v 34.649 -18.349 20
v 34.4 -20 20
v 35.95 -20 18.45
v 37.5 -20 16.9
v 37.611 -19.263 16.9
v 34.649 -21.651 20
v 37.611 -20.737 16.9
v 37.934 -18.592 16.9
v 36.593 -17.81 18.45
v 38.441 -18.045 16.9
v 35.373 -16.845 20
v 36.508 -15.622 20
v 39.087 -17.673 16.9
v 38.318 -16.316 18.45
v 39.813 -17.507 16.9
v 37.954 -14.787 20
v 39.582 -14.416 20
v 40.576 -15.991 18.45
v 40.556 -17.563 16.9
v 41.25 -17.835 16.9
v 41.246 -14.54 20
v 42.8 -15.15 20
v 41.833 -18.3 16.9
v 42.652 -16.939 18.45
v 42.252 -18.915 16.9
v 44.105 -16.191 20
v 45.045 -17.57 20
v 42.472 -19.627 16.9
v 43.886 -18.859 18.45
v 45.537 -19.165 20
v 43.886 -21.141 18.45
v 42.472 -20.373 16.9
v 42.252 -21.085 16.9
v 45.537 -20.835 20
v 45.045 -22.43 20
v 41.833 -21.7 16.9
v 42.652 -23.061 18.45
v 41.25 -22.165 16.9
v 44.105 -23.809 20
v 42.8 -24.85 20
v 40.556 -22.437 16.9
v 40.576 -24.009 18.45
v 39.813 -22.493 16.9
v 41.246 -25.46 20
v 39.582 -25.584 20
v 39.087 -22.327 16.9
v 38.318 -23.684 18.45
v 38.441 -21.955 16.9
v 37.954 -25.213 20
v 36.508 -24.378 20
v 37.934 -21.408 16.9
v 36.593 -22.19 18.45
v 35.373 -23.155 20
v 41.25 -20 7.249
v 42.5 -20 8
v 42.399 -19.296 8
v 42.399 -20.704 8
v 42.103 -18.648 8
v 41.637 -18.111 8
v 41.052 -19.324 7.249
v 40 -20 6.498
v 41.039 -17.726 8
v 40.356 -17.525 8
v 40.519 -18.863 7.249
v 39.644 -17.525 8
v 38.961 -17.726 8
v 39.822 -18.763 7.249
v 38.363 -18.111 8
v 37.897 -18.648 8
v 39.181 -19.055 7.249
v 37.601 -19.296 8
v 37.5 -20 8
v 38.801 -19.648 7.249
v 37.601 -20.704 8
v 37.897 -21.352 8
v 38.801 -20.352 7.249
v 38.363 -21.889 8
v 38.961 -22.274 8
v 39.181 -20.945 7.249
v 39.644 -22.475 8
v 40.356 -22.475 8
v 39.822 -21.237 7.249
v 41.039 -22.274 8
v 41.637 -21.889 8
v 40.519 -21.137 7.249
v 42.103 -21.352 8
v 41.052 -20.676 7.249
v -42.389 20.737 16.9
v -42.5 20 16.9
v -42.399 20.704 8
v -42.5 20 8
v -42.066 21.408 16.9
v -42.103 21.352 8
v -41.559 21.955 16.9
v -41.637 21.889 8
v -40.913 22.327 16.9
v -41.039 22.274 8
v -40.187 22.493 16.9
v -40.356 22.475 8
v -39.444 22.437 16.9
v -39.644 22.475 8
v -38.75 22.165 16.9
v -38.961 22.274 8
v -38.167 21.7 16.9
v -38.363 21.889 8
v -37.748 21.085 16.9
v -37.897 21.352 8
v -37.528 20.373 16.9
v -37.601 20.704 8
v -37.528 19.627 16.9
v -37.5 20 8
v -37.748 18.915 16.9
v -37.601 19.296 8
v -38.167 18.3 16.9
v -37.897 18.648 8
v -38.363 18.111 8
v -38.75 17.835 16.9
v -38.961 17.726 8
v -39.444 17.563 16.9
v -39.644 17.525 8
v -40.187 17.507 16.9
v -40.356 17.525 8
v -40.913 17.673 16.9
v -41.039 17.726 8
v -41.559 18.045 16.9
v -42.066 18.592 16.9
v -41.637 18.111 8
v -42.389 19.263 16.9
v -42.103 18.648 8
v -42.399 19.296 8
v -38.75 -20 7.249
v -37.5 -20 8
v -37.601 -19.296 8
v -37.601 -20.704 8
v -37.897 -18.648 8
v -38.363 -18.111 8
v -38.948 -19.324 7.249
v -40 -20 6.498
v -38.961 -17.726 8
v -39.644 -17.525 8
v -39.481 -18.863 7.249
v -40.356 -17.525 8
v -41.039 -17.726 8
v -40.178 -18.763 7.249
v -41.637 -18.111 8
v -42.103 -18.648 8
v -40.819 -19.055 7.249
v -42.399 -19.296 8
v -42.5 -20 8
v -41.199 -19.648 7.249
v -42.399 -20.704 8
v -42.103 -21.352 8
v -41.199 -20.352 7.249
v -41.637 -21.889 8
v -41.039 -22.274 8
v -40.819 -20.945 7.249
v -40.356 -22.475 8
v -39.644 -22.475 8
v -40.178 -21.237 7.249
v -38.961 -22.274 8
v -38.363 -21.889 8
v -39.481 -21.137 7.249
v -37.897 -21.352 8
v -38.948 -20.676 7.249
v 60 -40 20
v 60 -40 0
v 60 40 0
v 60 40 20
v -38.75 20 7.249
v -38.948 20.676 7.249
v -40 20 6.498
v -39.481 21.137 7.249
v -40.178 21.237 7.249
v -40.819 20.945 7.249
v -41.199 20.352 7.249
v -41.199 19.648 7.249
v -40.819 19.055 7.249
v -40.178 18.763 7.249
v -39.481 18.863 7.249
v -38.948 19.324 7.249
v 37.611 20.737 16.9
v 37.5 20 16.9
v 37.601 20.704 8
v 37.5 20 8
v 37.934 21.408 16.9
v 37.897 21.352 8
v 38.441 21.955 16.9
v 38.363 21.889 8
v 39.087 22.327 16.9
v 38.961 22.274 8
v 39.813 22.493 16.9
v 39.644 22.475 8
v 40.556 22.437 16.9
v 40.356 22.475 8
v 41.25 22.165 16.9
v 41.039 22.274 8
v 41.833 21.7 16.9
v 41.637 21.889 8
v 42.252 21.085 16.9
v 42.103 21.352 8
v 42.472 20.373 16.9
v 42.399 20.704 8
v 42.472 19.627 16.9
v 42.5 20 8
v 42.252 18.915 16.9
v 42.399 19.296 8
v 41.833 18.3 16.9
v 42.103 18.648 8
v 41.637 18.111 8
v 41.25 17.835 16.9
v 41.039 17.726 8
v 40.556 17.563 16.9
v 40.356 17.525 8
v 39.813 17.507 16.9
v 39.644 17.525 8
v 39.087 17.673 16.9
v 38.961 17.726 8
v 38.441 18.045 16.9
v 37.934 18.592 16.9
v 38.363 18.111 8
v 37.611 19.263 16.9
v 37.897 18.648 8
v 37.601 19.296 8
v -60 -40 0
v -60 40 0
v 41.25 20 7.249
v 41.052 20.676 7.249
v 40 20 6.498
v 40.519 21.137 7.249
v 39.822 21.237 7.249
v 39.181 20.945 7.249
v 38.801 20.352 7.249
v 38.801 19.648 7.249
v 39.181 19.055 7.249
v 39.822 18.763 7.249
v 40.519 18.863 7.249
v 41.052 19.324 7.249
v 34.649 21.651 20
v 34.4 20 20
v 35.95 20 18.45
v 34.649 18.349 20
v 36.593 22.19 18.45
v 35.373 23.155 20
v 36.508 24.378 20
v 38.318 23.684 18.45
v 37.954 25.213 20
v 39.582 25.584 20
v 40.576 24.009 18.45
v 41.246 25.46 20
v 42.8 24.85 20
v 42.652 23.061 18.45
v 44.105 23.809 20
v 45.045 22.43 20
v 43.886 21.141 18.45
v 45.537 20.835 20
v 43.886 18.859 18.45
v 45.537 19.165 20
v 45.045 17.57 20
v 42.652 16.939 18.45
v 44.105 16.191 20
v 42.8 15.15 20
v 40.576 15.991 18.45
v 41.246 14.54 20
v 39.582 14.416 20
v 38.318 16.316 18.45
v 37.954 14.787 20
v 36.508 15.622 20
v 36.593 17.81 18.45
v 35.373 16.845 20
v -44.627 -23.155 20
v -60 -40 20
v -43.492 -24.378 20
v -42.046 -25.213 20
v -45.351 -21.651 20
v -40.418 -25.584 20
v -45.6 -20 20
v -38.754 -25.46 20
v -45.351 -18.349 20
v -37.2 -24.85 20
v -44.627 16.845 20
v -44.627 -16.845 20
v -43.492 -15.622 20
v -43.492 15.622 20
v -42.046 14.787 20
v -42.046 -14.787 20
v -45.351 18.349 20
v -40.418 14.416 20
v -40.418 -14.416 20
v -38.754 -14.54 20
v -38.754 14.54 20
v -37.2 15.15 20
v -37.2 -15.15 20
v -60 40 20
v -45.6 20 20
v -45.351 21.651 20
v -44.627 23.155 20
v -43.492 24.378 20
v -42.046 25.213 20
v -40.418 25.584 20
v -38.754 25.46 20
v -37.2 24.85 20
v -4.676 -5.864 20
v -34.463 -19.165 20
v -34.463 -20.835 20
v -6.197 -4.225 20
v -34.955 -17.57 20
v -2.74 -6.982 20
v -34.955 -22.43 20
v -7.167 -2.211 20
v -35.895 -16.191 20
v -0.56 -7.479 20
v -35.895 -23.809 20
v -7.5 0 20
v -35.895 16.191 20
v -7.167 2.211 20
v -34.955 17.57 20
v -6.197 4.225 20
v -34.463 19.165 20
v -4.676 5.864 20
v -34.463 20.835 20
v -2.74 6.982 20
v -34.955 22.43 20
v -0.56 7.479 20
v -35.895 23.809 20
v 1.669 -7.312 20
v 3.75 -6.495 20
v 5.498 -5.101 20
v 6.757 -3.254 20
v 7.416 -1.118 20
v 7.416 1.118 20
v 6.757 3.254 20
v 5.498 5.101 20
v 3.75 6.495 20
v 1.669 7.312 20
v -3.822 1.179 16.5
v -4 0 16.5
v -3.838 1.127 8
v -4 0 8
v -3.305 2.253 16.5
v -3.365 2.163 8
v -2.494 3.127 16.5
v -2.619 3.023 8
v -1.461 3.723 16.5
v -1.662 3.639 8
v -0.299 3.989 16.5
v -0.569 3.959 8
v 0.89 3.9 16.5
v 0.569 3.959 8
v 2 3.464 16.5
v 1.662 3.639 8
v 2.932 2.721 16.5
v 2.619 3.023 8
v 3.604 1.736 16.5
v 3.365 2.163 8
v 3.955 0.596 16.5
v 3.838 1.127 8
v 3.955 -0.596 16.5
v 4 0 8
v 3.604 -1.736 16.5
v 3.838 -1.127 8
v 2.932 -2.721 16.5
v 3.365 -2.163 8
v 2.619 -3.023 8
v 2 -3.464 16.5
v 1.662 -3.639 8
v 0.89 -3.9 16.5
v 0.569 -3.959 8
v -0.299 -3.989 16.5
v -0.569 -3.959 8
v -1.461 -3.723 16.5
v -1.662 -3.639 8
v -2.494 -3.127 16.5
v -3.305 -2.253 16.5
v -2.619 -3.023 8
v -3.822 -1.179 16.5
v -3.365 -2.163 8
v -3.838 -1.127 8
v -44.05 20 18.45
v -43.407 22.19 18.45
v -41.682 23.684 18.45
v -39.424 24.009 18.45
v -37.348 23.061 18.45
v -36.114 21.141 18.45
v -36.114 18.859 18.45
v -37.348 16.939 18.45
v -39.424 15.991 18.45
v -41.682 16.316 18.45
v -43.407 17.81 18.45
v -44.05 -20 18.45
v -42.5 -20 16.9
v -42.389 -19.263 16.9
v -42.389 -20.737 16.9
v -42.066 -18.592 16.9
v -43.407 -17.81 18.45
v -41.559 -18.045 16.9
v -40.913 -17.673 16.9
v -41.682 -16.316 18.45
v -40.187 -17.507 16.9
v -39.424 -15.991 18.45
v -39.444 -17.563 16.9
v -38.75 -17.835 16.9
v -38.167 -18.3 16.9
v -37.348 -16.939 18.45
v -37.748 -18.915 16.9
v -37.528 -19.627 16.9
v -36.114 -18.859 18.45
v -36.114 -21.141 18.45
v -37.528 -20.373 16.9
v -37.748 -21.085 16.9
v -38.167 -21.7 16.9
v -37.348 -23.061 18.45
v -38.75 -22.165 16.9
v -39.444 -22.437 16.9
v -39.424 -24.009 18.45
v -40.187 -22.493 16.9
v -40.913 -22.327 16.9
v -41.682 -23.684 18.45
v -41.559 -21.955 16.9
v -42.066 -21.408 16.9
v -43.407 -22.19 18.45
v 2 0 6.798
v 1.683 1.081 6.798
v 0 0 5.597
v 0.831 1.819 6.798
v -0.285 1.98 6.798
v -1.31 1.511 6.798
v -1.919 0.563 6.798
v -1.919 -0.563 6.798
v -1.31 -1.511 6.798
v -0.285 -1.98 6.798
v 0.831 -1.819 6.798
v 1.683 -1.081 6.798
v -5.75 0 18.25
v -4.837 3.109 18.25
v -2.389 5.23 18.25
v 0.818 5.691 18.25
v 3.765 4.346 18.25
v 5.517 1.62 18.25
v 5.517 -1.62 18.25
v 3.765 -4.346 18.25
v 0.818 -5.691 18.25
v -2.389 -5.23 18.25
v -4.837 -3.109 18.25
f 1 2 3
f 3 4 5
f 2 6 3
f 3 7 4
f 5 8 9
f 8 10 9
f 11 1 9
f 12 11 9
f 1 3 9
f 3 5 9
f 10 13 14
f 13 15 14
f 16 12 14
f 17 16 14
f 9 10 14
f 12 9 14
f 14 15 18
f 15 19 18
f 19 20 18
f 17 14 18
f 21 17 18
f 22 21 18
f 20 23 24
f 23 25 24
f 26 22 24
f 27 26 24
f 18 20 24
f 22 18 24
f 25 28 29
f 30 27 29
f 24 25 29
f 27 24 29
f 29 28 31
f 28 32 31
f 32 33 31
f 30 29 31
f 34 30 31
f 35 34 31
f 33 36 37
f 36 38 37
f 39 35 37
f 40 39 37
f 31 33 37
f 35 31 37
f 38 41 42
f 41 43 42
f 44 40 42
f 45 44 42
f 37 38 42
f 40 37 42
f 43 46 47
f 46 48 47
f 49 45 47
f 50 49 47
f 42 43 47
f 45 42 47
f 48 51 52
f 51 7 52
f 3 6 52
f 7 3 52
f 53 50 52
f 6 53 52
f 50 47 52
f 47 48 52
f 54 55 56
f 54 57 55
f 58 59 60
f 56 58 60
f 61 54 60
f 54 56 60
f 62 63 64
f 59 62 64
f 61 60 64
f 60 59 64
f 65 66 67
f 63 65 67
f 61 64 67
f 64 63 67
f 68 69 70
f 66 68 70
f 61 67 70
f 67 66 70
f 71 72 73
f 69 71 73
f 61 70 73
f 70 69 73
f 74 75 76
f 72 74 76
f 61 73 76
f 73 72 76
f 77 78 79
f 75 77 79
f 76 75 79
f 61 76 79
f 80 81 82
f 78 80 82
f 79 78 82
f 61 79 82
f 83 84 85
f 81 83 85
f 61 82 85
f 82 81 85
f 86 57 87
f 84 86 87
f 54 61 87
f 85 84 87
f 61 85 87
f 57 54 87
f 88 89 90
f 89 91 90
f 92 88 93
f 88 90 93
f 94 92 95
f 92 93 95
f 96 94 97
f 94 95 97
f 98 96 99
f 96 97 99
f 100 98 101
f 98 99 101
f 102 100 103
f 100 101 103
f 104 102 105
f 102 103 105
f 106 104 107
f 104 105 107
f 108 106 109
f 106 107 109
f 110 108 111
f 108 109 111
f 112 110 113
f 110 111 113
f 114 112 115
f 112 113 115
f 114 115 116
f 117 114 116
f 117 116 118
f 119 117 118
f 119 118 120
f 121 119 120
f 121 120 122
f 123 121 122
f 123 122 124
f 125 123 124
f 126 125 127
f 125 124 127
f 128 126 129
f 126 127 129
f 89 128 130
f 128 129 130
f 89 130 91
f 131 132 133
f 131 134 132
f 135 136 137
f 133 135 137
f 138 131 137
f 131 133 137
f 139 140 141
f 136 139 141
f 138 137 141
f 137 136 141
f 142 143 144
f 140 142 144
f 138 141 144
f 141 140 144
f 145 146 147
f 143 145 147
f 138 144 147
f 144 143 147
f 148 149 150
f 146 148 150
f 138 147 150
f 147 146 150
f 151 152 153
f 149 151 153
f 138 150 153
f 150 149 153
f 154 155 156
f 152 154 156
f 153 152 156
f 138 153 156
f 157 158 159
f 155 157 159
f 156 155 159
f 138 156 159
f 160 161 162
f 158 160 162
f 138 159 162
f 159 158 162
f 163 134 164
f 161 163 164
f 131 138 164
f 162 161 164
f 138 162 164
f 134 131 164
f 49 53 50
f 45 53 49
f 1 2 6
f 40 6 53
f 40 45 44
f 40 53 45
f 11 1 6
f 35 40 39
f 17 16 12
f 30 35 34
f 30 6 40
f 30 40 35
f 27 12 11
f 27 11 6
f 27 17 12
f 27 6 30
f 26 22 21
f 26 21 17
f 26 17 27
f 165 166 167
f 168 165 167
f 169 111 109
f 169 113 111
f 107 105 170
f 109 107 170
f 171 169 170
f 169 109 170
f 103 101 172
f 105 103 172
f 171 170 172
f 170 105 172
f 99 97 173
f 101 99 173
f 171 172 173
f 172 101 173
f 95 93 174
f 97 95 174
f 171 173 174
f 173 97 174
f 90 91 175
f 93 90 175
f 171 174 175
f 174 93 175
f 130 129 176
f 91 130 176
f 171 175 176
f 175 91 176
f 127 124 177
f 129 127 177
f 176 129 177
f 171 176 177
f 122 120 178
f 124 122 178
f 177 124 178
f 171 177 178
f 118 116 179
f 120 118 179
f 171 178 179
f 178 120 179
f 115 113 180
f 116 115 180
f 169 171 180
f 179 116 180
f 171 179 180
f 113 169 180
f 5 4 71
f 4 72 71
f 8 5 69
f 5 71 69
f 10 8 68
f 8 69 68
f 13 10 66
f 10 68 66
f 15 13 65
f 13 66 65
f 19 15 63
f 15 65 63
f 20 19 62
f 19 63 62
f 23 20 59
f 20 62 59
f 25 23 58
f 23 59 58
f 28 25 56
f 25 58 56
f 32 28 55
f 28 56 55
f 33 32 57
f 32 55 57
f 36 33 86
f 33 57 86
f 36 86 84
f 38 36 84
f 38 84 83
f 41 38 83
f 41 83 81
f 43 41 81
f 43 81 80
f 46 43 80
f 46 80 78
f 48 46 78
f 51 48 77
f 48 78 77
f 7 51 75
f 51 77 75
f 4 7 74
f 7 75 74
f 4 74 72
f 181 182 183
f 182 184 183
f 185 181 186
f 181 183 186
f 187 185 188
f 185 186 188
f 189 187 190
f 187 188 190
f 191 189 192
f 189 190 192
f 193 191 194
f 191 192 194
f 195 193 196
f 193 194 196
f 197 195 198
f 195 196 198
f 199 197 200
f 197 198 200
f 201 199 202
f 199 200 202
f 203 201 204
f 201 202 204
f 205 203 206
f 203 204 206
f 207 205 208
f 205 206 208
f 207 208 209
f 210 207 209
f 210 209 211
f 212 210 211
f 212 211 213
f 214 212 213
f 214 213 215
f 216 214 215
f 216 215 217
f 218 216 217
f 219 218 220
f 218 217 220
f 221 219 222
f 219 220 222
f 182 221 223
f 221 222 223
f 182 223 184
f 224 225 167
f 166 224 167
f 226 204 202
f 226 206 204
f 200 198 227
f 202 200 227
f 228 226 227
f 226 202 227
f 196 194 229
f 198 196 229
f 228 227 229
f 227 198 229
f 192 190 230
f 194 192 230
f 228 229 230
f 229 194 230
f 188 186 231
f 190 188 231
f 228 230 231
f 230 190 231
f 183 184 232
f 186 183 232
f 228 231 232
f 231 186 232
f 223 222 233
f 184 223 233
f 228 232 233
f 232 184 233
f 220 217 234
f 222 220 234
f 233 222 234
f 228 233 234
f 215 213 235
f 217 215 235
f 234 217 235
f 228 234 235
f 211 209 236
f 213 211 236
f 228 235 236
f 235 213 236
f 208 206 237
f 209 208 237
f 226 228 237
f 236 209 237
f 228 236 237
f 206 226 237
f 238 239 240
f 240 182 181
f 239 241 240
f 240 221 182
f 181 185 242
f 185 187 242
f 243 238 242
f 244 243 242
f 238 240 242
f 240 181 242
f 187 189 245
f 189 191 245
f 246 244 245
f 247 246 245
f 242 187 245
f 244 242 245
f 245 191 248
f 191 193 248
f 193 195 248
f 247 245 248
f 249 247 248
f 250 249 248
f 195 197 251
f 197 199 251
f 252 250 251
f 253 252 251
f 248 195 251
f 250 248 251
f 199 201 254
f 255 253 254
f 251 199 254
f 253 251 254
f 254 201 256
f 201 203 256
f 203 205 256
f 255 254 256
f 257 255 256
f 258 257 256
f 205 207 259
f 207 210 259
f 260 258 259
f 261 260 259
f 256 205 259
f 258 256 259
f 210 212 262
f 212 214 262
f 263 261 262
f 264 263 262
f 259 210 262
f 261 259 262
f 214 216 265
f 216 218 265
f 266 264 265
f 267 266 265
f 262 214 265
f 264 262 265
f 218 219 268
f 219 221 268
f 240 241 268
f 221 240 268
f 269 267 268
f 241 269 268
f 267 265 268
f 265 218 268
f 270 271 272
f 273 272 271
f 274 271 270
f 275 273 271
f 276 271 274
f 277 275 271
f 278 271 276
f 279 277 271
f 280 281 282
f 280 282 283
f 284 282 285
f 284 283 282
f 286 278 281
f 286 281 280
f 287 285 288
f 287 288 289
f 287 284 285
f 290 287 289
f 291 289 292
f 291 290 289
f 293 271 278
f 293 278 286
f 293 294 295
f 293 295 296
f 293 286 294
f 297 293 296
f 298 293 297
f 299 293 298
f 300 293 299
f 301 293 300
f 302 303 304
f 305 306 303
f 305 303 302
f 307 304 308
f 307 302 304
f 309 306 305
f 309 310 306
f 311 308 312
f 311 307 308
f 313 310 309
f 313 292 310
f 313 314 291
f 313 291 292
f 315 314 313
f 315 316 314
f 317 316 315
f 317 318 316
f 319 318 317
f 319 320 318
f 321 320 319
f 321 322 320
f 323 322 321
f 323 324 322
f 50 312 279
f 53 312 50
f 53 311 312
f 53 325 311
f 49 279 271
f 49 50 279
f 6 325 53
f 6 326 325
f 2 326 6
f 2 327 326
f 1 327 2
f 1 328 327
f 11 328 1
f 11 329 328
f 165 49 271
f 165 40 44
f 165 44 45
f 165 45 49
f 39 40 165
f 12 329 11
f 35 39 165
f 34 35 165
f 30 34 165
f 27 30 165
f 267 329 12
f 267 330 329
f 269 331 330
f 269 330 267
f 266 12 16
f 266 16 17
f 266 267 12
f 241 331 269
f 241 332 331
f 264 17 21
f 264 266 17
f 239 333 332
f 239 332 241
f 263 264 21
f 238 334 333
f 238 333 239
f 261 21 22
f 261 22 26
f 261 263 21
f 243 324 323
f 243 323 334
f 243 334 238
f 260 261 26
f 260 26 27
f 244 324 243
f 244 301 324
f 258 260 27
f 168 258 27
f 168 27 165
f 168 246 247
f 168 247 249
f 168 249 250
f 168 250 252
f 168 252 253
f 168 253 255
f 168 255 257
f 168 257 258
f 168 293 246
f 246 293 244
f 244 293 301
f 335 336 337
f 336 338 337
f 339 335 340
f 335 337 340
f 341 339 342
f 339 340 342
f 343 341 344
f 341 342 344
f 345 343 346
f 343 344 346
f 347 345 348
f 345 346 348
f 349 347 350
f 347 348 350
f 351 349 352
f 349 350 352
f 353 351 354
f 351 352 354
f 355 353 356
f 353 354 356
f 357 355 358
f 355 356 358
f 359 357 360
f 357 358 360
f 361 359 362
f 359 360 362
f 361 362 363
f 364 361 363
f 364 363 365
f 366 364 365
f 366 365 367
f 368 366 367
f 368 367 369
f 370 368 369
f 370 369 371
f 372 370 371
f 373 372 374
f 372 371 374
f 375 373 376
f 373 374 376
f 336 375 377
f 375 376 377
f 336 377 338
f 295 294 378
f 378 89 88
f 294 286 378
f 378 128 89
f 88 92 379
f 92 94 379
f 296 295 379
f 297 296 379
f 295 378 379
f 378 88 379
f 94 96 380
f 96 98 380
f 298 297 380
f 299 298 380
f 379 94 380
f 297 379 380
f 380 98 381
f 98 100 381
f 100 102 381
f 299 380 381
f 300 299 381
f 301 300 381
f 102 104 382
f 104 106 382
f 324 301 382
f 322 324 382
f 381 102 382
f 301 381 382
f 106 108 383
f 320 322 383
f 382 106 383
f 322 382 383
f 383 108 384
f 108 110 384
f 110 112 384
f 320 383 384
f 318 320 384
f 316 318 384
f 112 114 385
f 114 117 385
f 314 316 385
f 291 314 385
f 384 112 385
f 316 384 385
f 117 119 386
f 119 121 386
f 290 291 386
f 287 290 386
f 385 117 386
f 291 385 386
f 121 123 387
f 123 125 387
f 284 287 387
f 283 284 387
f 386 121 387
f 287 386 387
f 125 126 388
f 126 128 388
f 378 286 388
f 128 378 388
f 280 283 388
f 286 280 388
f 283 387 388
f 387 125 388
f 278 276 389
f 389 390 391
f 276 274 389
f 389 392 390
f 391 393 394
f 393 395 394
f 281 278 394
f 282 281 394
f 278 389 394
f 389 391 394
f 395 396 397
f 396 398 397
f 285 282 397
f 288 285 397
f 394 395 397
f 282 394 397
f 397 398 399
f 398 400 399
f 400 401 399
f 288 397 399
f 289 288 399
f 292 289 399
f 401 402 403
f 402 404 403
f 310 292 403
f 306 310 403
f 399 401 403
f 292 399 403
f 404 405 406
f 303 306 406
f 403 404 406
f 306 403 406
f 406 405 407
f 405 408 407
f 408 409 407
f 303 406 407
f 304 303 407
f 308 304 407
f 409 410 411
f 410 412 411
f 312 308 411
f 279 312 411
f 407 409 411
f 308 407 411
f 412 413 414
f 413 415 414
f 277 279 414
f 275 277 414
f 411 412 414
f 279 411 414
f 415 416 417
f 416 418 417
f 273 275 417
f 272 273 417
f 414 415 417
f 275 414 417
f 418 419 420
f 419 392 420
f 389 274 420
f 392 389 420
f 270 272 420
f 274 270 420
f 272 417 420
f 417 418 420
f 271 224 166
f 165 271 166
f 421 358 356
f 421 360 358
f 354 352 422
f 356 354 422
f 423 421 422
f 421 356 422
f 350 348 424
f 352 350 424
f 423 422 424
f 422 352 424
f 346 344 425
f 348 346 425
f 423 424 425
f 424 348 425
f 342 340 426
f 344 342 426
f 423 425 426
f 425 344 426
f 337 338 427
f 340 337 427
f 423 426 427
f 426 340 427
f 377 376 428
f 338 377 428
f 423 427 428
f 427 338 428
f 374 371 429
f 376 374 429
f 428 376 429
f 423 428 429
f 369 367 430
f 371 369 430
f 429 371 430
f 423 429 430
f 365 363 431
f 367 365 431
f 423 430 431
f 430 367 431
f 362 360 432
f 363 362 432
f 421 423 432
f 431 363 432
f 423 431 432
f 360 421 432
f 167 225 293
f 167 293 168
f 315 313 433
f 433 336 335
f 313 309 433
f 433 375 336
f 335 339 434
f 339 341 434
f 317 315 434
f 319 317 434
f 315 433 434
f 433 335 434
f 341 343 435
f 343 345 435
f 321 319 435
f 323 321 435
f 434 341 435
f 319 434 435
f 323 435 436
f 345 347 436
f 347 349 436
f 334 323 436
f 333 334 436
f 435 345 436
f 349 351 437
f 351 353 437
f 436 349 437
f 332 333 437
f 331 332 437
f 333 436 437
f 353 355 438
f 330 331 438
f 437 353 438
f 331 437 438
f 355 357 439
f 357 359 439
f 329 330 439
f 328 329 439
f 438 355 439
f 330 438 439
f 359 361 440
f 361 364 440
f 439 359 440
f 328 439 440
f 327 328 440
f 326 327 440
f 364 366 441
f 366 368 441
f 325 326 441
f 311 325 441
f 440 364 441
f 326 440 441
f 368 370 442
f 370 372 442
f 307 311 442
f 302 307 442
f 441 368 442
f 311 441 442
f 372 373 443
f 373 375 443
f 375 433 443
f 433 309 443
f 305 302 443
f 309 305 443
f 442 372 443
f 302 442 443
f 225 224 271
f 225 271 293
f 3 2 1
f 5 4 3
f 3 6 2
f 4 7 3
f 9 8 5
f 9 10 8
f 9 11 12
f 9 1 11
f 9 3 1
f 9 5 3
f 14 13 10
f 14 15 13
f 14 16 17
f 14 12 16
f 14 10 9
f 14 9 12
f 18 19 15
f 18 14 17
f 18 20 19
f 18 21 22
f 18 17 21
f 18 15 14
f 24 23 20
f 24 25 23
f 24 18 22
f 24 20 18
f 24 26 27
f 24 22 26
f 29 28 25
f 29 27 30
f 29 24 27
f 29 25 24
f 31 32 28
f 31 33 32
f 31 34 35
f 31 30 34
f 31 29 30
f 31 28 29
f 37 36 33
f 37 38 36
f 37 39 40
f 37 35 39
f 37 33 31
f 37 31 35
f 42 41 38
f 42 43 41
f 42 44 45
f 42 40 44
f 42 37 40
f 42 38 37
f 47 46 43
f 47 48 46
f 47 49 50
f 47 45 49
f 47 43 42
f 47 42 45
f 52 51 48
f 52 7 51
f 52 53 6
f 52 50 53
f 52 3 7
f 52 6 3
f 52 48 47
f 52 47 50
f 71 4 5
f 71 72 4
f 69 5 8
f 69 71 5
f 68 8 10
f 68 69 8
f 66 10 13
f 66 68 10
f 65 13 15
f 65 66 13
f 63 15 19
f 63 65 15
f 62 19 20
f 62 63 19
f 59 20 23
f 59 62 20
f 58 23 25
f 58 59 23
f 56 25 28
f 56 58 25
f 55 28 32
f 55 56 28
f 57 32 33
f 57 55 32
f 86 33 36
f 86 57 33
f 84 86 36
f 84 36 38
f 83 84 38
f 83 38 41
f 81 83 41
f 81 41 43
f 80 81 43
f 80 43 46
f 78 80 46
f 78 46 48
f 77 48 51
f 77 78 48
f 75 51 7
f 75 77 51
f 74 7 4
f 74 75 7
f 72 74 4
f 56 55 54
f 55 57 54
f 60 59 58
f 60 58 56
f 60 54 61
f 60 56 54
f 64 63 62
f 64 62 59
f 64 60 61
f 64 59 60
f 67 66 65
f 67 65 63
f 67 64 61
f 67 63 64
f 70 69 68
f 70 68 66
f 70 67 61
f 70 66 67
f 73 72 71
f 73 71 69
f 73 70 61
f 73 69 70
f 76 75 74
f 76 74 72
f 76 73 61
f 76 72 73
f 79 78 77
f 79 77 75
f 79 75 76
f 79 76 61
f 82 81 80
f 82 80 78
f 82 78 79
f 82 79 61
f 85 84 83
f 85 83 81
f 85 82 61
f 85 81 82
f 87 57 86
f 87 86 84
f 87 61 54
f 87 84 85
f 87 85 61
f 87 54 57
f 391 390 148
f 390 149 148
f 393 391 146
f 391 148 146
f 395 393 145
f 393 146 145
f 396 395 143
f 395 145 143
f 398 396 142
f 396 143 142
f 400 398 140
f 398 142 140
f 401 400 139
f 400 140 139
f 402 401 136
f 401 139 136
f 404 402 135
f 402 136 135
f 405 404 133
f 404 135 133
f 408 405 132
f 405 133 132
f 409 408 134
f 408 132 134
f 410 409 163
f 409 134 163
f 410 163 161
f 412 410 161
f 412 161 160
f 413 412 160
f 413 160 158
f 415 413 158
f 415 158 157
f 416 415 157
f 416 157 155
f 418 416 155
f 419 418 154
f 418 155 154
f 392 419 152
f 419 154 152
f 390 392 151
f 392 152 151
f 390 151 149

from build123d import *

# Parameters (mm, degrees)
F0_W           = 120
F0_H           = 80
F1_DEPTH       = 20
F3_D           = 5
F3_DEPTH       = 12
F3_CSINK_D     = 11.2
F3_CSINK_ANGLE = 90
F3_TIP         = 1.5021515476
F4_R           = 5.6
F5_DEPTH       = 20
F8_D           = 8
F8_DEPTH       = 12
F8_CSINK_D     = 15
F8_CSINK_ANGLE = 90
F8_TIP         = 2.4034424761


with BuildPart() as f1:
    # F0 (on Top) → F1 (new body)
    with BuildSketch(Plane.XY):
        Rectangle(F0_W, F0_H)
    extrude(amount=F1_DEPTH)

    # F3
    with Locations(Plane.XY.offset(20)):
        with Locations((-40, -20), (40, -20), (40, 20), (-40, 20)):
            CounterSinkHole(F3_D / 2, F3_CSINK_D / 2, depth=F3_DEPTH, counter_sink_angle=F3_CSINK_ANGLE)
            with Locations((0, 0, -(F3_DEPTH + F3_TIP / 2))):  # 118° drill point
                Cone(0, F3_D / 2, F3_TIP, mode=Mode.SUBTRACT)


with BuildPart() as f5:
    # F4 (on face) → F5 (new body)
    with BuildSketch(Plane.XY.offset(20)):
        with Locations((40, -20)):
            Circle(F4_R)
    extrude(amount=-F5_DEPTH)

    # F6: cut F1
    add(f1.part, mode=Mode.SUBTRACT)


with BuildPart() as f1_1:
    add(f1.part)

    # F8
    with Locations(Plane.XY.offset(20)):
        with Locations((0, 0)):
            CounterSinkHole(F8_D / 2, F8_CSINK_D / 2, depth=F8_DEPTH, counter_sink_angle=F8_CSINK_ANGLE)
            with Locations((0, 0, -(F8_DEPTH + F8_TIP / 2))):  # 118° drill point
                Cone(0, F8_D / 2, F8_TIP, mode=Mode.SUBTRACT)


solid = Compound([f5.part, f1_1.part])
